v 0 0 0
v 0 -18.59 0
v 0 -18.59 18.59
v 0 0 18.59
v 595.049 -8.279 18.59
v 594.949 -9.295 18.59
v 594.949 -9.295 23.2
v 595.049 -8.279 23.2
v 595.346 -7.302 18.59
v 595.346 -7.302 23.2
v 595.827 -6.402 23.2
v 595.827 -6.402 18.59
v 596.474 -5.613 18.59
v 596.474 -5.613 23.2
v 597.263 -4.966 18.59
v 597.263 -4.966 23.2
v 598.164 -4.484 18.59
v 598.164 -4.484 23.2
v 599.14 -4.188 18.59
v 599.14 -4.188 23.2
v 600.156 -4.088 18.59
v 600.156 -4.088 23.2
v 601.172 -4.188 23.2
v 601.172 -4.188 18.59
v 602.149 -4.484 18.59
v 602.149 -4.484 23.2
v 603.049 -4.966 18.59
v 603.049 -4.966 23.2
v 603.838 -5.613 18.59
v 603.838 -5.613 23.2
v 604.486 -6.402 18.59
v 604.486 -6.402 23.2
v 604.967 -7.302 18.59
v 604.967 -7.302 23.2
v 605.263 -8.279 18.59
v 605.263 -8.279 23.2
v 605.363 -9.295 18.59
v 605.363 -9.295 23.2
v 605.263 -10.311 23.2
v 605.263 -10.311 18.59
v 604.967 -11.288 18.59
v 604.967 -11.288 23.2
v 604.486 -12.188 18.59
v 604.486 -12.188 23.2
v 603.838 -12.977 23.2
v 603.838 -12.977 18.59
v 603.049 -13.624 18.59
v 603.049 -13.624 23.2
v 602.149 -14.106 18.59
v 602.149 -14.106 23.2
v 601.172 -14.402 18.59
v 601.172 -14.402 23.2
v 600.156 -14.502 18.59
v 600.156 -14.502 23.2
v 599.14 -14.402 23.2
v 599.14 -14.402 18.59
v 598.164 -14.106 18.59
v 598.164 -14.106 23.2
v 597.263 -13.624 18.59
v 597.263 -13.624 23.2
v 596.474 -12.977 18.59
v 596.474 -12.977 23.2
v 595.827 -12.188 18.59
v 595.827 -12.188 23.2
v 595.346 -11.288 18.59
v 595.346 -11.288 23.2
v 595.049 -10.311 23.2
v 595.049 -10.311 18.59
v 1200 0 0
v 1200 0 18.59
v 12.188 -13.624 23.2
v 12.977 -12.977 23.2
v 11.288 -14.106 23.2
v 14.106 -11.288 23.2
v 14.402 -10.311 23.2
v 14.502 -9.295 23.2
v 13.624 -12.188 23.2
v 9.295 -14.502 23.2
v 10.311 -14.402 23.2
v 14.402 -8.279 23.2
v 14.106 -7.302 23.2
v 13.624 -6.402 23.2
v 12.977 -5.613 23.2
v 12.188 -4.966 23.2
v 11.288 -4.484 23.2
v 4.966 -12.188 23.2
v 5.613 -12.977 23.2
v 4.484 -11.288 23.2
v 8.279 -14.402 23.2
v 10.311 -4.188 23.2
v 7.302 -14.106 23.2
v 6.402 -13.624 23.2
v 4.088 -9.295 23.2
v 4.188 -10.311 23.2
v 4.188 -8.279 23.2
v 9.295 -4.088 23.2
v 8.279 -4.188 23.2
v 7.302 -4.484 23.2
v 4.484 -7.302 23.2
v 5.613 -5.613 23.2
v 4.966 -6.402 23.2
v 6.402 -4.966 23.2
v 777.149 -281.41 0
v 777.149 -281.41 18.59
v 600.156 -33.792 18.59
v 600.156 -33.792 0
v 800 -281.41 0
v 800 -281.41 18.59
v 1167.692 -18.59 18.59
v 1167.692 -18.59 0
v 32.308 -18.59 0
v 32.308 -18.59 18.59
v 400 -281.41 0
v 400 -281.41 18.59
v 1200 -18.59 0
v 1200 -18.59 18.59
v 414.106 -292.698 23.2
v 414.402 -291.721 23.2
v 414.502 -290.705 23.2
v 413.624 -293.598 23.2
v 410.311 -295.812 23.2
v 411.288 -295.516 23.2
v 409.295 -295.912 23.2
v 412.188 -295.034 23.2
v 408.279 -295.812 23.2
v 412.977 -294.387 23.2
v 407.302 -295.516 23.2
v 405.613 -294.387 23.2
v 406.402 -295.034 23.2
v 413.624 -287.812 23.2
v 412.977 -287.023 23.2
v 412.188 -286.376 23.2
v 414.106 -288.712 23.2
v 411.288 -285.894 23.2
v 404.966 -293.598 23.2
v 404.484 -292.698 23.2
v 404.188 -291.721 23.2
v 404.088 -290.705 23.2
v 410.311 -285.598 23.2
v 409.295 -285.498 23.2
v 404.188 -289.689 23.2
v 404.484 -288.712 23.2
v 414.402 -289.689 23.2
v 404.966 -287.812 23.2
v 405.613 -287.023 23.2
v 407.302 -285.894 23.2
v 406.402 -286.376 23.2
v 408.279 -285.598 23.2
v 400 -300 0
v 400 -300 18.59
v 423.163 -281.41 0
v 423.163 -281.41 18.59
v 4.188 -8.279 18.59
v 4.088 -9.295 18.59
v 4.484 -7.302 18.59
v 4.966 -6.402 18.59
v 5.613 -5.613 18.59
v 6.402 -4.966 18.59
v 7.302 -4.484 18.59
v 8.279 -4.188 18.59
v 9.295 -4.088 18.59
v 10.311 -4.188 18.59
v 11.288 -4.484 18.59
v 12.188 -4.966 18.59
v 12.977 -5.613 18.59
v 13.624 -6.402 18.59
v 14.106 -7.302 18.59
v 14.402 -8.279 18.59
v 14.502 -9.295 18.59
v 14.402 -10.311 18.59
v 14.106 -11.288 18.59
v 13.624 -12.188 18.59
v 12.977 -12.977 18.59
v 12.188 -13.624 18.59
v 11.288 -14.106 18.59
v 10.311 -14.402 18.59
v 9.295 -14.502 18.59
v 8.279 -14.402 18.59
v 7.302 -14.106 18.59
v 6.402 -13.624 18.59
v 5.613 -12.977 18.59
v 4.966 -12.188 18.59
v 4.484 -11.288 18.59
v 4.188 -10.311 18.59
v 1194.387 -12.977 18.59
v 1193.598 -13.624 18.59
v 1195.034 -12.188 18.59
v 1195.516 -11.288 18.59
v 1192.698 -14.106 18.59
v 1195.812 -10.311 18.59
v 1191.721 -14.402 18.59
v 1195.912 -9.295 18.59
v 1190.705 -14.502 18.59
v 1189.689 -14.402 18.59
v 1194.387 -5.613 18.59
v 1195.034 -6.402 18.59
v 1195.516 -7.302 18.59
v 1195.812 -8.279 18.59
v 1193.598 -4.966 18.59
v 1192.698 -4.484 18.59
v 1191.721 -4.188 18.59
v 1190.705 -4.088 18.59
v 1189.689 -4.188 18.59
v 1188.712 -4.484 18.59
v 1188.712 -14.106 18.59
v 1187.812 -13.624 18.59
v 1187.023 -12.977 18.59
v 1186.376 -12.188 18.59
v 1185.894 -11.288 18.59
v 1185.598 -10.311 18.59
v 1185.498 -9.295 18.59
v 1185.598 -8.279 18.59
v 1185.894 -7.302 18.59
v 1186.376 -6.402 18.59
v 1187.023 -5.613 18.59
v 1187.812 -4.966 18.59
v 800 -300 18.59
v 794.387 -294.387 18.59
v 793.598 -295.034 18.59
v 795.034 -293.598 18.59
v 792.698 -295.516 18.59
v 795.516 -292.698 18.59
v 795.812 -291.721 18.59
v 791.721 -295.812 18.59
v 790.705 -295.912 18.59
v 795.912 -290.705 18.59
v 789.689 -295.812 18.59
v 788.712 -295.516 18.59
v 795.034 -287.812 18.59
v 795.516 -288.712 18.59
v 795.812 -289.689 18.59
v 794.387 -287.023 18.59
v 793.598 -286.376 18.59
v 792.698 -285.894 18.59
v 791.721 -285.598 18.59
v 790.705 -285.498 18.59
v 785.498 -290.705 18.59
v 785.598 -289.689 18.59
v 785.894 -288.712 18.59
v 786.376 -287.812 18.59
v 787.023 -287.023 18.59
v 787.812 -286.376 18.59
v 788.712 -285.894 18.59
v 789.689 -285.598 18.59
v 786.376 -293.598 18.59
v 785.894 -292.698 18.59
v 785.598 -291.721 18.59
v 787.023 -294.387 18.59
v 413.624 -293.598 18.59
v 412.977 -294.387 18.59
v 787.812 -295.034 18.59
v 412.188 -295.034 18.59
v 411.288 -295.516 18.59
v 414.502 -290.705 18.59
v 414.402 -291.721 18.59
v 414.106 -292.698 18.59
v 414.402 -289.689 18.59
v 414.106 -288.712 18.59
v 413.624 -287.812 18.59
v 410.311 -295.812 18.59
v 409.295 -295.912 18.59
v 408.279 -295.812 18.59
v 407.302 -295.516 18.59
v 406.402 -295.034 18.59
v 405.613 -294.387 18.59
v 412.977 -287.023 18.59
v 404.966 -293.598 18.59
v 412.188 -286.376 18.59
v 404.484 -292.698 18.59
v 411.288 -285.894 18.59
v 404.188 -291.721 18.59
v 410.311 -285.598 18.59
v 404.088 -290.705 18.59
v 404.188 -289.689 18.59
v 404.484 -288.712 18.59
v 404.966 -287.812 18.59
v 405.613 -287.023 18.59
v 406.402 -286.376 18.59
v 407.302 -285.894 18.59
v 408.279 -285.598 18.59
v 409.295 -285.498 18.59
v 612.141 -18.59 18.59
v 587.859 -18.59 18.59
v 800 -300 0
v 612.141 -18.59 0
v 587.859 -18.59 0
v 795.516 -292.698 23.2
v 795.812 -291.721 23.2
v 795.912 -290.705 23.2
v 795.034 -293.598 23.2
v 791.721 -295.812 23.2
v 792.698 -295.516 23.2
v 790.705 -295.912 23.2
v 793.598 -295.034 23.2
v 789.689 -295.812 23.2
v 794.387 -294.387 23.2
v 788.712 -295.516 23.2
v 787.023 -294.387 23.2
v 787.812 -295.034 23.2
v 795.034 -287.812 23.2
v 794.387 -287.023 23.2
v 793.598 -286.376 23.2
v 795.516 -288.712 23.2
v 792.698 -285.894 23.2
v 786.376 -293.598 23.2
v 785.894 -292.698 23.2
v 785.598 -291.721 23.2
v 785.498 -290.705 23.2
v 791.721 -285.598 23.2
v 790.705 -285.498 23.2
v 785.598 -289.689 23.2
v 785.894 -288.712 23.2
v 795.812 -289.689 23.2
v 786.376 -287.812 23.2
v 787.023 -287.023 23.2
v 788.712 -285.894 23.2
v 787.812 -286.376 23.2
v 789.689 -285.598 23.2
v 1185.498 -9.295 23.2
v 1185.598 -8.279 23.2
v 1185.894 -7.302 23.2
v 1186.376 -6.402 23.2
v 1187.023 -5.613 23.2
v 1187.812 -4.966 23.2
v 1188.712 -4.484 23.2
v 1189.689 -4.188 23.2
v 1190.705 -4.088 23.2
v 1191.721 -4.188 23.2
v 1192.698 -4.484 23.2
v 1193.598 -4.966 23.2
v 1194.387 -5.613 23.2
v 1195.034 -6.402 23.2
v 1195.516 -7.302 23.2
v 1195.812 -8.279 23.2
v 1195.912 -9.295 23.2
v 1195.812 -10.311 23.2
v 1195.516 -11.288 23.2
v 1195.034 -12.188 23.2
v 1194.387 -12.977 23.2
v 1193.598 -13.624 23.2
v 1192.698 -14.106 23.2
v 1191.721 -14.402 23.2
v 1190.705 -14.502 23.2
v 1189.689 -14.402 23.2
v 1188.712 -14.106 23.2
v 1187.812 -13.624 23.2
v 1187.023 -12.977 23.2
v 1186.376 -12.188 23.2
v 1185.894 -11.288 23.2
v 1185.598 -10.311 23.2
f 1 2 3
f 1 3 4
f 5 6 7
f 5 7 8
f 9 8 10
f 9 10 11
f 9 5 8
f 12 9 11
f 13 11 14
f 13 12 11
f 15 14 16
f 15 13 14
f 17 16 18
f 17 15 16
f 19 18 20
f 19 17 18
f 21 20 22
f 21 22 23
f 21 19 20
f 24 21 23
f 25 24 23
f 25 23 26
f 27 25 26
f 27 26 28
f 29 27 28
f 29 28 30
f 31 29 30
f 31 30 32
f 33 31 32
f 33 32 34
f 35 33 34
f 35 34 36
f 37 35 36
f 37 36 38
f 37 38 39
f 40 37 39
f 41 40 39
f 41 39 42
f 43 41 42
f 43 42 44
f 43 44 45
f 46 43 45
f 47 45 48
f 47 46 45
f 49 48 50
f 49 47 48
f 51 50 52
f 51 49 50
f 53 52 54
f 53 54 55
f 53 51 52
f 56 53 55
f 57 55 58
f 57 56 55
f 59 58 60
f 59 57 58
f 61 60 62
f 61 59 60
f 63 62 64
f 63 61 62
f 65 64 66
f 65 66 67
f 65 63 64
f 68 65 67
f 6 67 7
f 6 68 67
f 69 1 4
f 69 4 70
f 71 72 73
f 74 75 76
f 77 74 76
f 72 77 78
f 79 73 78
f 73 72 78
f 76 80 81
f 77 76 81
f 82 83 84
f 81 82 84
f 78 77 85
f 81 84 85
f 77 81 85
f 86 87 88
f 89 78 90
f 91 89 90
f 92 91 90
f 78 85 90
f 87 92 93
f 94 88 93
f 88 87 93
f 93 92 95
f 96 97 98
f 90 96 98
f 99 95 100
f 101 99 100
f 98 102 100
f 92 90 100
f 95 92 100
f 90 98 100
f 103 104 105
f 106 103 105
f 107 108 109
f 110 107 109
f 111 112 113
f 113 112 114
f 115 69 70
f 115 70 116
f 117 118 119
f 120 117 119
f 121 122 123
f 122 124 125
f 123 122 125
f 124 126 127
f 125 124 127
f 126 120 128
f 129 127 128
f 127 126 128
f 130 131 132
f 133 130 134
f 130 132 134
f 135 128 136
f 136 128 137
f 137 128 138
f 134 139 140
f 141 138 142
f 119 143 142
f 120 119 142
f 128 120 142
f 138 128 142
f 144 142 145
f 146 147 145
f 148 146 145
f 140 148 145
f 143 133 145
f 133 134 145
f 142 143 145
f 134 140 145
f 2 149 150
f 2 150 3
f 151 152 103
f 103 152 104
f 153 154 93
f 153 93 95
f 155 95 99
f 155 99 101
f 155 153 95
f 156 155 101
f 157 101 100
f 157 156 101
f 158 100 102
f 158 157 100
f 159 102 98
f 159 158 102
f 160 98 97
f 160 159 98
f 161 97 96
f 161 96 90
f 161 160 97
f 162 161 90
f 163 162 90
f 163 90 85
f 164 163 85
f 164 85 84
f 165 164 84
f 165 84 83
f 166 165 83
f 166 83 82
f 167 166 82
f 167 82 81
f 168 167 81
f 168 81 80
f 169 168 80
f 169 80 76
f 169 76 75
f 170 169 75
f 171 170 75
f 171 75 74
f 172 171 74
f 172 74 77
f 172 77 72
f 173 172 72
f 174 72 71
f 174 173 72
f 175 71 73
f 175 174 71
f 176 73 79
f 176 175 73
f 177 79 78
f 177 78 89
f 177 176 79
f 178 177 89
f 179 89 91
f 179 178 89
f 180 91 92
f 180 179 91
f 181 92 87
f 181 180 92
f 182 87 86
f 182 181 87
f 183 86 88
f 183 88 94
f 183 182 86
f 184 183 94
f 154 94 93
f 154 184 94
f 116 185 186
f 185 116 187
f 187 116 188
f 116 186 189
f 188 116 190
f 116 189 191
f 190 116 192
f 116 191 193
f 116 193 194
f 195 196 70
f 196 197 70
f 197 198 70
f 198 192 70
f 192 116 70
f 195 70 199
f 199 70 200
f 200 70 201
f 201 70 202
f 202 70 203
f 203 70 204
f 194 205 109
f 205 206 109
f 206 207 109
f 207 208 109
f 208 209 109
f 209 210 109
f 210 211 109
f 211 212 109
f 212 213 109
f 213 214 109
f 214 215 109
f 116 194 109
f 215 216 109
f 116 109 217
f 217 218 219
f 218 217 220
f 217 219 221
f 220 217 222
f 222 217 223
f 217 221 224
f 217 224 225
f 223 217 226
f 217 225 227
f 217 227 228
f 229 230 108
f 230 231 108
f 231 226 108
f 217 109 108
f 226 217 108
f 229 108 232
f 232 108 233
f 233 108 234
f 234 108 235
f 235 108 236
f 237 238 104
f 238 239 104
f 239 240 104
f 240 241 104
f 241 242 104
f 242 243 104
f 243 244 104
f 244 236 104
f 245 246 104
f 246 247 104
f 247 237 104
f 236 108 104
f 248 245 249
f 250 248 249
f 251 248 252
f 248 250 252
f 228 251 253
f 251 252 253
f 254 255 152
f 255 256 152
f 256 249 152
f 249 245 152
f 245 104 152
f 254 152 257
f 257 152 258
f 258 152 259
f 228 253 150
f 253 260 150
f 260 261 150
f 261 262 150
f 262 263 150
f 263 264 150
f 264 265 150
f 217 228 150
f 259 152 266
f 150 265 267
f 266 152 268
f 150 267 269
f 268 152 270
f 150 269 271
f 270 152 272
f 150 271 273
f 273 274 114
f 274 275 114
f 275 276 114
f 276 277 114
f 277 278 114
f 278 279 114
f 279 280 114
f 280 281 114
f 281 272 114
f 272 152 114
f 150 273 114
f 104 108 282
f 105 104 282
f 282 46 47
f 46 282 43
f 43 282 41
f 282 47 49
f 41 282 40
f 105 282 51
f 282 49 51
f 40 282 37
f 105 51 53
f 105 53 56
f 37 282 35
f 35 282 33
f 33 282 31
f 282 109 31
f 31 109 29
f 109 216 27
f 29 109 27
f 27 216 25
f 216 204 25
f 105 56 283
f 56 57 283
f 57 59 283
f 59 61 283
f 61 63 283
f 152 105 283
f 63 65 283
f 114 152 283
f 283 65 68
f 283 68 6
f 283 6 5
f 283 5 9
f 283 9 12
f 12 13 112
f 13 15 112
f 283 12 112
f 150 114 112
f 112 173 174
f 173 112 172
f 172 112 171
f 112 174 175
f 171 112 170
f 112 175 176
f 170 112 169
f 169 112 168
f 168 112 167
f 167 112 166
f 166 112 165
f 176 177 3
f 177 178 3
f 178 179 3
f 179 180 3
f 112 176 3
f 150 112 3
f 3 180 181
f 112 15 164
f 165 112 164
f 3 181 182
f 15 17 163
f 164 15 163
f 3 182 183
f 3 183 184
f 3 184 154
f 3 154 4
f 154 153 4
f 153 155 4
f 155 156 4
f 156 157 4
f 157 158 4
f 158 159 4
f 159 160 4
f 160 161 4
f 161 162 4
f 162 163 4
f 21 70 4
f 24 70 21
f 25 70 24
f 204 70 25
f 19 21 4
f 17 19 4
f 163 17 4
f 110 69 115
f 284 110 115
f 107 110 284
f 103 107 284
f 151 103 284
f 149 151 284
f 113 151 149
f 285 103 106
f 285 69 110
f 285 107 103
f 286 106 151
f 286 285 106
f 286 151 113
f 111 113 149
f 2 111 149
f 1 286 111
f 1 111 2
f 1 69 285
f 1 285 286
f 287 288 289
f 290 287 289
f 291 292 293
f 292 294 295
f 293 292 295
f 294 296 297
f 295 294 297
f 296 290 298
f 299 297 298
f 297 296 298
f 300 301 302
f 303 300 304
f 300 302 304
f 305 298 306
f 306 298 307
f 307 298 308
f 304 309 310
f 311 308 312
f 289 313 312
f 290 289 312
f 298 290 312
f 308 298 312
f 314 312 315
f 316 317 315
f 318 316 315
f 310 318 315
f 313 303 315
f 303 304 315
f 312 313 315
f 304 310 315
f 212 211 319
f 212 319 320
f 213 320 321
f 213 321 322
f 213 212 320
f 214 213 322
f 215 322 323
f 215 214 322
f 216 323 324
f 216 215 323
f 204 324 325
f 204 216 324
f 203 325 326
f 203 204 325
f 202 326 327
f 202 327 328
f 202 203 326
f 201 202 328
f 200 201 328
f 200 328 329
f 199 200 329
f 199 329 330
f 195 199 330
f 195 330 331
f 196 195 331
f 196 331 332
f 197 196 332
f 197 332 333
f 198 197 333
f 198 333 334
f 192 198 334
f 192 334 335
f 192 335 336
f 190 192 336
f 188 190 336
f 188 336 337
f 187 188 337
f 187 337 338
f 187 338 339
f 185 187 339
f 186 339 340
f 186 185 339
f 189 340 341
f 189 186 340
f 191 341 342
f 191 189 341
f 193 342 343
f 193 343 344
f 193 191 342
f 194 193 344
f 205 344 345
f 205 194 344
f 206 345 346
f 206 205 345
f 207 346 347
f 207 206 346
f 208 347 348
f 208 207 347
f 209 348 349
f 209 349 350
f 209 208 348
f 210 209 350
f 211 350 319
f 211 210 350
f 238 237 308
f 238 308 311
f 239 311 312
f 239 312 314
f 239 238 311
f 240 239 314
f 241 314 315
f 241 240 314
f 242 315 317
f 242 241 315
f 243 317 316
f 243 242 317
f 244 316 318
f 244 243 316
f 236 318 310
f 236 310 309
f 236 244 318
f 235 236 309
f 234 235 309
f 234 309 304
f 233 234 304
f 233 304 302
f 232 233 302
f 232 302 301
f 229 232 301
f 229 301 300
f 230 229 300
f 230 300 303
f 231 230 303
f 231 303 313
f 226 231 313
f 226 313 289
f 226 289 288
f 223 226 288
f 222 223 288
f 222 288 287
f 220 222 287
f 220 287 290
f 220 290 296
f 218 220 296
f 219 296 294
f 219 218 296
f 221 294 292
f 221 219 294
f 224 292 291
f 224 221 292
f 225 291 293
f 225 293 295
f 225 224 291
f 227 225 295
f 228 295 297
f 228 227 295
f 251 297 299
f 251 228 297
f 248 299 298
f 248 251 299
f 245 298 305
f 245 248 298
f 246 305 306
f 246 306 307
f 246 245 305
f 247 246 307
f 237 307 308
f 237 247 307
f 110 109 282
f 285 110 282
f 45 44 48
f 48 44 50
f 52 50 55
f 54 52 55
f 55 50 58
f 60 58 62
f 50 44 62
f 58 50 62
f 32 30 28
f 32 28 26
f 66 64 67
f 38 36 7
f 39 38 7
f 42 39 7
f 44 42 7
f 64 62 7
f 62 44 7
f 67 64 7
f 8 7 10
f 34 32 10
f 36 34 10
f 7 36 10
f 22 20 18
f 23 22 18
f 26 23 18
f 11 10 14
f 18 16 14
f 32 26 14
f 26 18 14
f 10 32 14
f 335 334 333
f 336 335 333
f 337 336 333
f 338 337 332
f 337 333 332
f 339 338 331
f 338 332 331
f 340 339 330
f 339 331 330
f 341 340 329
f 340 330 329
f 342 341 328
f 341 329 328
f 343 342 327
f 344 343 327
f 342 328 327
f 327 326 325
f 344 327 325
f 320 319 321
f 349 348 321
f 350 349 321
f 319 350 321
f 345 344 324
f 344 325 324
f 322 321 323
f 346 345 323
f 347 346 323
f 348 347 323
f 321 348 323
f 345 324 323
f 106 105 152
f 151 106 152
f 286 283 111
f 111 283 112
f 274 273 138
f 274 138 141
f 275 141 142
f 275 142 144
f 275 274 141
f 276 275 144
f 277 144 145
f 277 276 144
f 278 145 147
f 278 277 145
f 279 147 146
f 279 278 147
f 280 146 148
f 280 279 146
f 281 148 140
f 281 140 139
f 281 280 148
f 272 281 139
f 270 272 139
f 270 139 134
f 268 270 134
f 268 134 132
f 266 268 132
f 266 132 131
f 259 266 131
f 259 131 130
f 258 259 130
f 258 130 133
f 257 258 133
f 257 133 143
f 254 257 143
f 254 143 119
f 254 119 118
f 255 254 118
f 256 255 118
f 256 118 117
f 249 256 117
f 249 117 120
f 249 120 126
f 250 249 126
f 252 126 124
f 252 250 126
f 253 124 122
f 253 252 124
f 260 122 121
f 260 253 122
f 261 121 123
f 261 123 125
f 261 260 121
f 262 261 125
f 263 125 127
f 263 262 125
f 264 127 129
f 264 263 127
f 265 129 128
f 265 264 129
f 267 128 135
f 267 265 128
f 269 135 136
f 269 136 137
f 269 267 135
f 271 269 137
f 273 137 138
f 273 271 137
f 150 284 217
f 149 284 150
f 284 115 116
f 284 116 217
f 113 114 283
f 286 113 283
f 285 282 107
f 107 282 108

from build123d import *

# Parameters (mm, degrees)
BOSS_EXTRUDE1_DEPTH = 18.59
CUT_EXTRUDE2_DEPTH  = 1238.071375507
SKETCH4_R           = 5.207
BOSS_EXTRUDE3_DEPTH = 23.2


with BuildPart() as part:
    # Sketch2 → Boss-Extrude1 (new body)
    with BuildSketch(Plane.XY):
        Polygon((0, 0), (1200, 0), (1200, -18.59), (800, -300), (400, -300), (0, -18.59), align=None)
    extrude(amount=BOSS_EXTRUDE1_DEPTH)

    # Sketch3 → Cut-Extrude2 (cut, through all)
    with BuildSketch(Plane.XY.offset(18.59)):
        Polygon((32.308203874, -18.59), (400, -281.41), (587.859378773, -18.59), align=None)
        Polygon((600.156298082, -33.792330813), (423.163293339, -281.41), (777.149302825, -281.41), align=None)
        Polygon((800, -281.41), (1167.691796126, -18.59), (612.140621227, -18.59), align=None)
    extrude(amount=-CUT_EXTRUDE2_DEPTH, mode=Mode.SUBTRACT)

    # Sketch4 → Boss-Extrude3 (add)
    with BuildSketch(Plane(origin=(0, 0, 0), x_dir=(-1, 0, 0), z_dir=(0, 0, -1))):
        with Locations((-1190.705, -9.295)):
            Circle(SKETCH4_R)
        with Locations((-600.156298082, -9.295)):
            Circle(SKETCH4_R)
        with Locations((-9.295, -9.295)):
            Circle(SKETCH4_R)
        with Locations((-790.705, -290.705)):
            Circle(SKETCH4_R)
        with Locations((-409.295, -290.705)):
            Circle(SKETCH4_R)
    extrude(amount=-BOSS_EXTRUDE3_DEPTH)


solid = part.part
